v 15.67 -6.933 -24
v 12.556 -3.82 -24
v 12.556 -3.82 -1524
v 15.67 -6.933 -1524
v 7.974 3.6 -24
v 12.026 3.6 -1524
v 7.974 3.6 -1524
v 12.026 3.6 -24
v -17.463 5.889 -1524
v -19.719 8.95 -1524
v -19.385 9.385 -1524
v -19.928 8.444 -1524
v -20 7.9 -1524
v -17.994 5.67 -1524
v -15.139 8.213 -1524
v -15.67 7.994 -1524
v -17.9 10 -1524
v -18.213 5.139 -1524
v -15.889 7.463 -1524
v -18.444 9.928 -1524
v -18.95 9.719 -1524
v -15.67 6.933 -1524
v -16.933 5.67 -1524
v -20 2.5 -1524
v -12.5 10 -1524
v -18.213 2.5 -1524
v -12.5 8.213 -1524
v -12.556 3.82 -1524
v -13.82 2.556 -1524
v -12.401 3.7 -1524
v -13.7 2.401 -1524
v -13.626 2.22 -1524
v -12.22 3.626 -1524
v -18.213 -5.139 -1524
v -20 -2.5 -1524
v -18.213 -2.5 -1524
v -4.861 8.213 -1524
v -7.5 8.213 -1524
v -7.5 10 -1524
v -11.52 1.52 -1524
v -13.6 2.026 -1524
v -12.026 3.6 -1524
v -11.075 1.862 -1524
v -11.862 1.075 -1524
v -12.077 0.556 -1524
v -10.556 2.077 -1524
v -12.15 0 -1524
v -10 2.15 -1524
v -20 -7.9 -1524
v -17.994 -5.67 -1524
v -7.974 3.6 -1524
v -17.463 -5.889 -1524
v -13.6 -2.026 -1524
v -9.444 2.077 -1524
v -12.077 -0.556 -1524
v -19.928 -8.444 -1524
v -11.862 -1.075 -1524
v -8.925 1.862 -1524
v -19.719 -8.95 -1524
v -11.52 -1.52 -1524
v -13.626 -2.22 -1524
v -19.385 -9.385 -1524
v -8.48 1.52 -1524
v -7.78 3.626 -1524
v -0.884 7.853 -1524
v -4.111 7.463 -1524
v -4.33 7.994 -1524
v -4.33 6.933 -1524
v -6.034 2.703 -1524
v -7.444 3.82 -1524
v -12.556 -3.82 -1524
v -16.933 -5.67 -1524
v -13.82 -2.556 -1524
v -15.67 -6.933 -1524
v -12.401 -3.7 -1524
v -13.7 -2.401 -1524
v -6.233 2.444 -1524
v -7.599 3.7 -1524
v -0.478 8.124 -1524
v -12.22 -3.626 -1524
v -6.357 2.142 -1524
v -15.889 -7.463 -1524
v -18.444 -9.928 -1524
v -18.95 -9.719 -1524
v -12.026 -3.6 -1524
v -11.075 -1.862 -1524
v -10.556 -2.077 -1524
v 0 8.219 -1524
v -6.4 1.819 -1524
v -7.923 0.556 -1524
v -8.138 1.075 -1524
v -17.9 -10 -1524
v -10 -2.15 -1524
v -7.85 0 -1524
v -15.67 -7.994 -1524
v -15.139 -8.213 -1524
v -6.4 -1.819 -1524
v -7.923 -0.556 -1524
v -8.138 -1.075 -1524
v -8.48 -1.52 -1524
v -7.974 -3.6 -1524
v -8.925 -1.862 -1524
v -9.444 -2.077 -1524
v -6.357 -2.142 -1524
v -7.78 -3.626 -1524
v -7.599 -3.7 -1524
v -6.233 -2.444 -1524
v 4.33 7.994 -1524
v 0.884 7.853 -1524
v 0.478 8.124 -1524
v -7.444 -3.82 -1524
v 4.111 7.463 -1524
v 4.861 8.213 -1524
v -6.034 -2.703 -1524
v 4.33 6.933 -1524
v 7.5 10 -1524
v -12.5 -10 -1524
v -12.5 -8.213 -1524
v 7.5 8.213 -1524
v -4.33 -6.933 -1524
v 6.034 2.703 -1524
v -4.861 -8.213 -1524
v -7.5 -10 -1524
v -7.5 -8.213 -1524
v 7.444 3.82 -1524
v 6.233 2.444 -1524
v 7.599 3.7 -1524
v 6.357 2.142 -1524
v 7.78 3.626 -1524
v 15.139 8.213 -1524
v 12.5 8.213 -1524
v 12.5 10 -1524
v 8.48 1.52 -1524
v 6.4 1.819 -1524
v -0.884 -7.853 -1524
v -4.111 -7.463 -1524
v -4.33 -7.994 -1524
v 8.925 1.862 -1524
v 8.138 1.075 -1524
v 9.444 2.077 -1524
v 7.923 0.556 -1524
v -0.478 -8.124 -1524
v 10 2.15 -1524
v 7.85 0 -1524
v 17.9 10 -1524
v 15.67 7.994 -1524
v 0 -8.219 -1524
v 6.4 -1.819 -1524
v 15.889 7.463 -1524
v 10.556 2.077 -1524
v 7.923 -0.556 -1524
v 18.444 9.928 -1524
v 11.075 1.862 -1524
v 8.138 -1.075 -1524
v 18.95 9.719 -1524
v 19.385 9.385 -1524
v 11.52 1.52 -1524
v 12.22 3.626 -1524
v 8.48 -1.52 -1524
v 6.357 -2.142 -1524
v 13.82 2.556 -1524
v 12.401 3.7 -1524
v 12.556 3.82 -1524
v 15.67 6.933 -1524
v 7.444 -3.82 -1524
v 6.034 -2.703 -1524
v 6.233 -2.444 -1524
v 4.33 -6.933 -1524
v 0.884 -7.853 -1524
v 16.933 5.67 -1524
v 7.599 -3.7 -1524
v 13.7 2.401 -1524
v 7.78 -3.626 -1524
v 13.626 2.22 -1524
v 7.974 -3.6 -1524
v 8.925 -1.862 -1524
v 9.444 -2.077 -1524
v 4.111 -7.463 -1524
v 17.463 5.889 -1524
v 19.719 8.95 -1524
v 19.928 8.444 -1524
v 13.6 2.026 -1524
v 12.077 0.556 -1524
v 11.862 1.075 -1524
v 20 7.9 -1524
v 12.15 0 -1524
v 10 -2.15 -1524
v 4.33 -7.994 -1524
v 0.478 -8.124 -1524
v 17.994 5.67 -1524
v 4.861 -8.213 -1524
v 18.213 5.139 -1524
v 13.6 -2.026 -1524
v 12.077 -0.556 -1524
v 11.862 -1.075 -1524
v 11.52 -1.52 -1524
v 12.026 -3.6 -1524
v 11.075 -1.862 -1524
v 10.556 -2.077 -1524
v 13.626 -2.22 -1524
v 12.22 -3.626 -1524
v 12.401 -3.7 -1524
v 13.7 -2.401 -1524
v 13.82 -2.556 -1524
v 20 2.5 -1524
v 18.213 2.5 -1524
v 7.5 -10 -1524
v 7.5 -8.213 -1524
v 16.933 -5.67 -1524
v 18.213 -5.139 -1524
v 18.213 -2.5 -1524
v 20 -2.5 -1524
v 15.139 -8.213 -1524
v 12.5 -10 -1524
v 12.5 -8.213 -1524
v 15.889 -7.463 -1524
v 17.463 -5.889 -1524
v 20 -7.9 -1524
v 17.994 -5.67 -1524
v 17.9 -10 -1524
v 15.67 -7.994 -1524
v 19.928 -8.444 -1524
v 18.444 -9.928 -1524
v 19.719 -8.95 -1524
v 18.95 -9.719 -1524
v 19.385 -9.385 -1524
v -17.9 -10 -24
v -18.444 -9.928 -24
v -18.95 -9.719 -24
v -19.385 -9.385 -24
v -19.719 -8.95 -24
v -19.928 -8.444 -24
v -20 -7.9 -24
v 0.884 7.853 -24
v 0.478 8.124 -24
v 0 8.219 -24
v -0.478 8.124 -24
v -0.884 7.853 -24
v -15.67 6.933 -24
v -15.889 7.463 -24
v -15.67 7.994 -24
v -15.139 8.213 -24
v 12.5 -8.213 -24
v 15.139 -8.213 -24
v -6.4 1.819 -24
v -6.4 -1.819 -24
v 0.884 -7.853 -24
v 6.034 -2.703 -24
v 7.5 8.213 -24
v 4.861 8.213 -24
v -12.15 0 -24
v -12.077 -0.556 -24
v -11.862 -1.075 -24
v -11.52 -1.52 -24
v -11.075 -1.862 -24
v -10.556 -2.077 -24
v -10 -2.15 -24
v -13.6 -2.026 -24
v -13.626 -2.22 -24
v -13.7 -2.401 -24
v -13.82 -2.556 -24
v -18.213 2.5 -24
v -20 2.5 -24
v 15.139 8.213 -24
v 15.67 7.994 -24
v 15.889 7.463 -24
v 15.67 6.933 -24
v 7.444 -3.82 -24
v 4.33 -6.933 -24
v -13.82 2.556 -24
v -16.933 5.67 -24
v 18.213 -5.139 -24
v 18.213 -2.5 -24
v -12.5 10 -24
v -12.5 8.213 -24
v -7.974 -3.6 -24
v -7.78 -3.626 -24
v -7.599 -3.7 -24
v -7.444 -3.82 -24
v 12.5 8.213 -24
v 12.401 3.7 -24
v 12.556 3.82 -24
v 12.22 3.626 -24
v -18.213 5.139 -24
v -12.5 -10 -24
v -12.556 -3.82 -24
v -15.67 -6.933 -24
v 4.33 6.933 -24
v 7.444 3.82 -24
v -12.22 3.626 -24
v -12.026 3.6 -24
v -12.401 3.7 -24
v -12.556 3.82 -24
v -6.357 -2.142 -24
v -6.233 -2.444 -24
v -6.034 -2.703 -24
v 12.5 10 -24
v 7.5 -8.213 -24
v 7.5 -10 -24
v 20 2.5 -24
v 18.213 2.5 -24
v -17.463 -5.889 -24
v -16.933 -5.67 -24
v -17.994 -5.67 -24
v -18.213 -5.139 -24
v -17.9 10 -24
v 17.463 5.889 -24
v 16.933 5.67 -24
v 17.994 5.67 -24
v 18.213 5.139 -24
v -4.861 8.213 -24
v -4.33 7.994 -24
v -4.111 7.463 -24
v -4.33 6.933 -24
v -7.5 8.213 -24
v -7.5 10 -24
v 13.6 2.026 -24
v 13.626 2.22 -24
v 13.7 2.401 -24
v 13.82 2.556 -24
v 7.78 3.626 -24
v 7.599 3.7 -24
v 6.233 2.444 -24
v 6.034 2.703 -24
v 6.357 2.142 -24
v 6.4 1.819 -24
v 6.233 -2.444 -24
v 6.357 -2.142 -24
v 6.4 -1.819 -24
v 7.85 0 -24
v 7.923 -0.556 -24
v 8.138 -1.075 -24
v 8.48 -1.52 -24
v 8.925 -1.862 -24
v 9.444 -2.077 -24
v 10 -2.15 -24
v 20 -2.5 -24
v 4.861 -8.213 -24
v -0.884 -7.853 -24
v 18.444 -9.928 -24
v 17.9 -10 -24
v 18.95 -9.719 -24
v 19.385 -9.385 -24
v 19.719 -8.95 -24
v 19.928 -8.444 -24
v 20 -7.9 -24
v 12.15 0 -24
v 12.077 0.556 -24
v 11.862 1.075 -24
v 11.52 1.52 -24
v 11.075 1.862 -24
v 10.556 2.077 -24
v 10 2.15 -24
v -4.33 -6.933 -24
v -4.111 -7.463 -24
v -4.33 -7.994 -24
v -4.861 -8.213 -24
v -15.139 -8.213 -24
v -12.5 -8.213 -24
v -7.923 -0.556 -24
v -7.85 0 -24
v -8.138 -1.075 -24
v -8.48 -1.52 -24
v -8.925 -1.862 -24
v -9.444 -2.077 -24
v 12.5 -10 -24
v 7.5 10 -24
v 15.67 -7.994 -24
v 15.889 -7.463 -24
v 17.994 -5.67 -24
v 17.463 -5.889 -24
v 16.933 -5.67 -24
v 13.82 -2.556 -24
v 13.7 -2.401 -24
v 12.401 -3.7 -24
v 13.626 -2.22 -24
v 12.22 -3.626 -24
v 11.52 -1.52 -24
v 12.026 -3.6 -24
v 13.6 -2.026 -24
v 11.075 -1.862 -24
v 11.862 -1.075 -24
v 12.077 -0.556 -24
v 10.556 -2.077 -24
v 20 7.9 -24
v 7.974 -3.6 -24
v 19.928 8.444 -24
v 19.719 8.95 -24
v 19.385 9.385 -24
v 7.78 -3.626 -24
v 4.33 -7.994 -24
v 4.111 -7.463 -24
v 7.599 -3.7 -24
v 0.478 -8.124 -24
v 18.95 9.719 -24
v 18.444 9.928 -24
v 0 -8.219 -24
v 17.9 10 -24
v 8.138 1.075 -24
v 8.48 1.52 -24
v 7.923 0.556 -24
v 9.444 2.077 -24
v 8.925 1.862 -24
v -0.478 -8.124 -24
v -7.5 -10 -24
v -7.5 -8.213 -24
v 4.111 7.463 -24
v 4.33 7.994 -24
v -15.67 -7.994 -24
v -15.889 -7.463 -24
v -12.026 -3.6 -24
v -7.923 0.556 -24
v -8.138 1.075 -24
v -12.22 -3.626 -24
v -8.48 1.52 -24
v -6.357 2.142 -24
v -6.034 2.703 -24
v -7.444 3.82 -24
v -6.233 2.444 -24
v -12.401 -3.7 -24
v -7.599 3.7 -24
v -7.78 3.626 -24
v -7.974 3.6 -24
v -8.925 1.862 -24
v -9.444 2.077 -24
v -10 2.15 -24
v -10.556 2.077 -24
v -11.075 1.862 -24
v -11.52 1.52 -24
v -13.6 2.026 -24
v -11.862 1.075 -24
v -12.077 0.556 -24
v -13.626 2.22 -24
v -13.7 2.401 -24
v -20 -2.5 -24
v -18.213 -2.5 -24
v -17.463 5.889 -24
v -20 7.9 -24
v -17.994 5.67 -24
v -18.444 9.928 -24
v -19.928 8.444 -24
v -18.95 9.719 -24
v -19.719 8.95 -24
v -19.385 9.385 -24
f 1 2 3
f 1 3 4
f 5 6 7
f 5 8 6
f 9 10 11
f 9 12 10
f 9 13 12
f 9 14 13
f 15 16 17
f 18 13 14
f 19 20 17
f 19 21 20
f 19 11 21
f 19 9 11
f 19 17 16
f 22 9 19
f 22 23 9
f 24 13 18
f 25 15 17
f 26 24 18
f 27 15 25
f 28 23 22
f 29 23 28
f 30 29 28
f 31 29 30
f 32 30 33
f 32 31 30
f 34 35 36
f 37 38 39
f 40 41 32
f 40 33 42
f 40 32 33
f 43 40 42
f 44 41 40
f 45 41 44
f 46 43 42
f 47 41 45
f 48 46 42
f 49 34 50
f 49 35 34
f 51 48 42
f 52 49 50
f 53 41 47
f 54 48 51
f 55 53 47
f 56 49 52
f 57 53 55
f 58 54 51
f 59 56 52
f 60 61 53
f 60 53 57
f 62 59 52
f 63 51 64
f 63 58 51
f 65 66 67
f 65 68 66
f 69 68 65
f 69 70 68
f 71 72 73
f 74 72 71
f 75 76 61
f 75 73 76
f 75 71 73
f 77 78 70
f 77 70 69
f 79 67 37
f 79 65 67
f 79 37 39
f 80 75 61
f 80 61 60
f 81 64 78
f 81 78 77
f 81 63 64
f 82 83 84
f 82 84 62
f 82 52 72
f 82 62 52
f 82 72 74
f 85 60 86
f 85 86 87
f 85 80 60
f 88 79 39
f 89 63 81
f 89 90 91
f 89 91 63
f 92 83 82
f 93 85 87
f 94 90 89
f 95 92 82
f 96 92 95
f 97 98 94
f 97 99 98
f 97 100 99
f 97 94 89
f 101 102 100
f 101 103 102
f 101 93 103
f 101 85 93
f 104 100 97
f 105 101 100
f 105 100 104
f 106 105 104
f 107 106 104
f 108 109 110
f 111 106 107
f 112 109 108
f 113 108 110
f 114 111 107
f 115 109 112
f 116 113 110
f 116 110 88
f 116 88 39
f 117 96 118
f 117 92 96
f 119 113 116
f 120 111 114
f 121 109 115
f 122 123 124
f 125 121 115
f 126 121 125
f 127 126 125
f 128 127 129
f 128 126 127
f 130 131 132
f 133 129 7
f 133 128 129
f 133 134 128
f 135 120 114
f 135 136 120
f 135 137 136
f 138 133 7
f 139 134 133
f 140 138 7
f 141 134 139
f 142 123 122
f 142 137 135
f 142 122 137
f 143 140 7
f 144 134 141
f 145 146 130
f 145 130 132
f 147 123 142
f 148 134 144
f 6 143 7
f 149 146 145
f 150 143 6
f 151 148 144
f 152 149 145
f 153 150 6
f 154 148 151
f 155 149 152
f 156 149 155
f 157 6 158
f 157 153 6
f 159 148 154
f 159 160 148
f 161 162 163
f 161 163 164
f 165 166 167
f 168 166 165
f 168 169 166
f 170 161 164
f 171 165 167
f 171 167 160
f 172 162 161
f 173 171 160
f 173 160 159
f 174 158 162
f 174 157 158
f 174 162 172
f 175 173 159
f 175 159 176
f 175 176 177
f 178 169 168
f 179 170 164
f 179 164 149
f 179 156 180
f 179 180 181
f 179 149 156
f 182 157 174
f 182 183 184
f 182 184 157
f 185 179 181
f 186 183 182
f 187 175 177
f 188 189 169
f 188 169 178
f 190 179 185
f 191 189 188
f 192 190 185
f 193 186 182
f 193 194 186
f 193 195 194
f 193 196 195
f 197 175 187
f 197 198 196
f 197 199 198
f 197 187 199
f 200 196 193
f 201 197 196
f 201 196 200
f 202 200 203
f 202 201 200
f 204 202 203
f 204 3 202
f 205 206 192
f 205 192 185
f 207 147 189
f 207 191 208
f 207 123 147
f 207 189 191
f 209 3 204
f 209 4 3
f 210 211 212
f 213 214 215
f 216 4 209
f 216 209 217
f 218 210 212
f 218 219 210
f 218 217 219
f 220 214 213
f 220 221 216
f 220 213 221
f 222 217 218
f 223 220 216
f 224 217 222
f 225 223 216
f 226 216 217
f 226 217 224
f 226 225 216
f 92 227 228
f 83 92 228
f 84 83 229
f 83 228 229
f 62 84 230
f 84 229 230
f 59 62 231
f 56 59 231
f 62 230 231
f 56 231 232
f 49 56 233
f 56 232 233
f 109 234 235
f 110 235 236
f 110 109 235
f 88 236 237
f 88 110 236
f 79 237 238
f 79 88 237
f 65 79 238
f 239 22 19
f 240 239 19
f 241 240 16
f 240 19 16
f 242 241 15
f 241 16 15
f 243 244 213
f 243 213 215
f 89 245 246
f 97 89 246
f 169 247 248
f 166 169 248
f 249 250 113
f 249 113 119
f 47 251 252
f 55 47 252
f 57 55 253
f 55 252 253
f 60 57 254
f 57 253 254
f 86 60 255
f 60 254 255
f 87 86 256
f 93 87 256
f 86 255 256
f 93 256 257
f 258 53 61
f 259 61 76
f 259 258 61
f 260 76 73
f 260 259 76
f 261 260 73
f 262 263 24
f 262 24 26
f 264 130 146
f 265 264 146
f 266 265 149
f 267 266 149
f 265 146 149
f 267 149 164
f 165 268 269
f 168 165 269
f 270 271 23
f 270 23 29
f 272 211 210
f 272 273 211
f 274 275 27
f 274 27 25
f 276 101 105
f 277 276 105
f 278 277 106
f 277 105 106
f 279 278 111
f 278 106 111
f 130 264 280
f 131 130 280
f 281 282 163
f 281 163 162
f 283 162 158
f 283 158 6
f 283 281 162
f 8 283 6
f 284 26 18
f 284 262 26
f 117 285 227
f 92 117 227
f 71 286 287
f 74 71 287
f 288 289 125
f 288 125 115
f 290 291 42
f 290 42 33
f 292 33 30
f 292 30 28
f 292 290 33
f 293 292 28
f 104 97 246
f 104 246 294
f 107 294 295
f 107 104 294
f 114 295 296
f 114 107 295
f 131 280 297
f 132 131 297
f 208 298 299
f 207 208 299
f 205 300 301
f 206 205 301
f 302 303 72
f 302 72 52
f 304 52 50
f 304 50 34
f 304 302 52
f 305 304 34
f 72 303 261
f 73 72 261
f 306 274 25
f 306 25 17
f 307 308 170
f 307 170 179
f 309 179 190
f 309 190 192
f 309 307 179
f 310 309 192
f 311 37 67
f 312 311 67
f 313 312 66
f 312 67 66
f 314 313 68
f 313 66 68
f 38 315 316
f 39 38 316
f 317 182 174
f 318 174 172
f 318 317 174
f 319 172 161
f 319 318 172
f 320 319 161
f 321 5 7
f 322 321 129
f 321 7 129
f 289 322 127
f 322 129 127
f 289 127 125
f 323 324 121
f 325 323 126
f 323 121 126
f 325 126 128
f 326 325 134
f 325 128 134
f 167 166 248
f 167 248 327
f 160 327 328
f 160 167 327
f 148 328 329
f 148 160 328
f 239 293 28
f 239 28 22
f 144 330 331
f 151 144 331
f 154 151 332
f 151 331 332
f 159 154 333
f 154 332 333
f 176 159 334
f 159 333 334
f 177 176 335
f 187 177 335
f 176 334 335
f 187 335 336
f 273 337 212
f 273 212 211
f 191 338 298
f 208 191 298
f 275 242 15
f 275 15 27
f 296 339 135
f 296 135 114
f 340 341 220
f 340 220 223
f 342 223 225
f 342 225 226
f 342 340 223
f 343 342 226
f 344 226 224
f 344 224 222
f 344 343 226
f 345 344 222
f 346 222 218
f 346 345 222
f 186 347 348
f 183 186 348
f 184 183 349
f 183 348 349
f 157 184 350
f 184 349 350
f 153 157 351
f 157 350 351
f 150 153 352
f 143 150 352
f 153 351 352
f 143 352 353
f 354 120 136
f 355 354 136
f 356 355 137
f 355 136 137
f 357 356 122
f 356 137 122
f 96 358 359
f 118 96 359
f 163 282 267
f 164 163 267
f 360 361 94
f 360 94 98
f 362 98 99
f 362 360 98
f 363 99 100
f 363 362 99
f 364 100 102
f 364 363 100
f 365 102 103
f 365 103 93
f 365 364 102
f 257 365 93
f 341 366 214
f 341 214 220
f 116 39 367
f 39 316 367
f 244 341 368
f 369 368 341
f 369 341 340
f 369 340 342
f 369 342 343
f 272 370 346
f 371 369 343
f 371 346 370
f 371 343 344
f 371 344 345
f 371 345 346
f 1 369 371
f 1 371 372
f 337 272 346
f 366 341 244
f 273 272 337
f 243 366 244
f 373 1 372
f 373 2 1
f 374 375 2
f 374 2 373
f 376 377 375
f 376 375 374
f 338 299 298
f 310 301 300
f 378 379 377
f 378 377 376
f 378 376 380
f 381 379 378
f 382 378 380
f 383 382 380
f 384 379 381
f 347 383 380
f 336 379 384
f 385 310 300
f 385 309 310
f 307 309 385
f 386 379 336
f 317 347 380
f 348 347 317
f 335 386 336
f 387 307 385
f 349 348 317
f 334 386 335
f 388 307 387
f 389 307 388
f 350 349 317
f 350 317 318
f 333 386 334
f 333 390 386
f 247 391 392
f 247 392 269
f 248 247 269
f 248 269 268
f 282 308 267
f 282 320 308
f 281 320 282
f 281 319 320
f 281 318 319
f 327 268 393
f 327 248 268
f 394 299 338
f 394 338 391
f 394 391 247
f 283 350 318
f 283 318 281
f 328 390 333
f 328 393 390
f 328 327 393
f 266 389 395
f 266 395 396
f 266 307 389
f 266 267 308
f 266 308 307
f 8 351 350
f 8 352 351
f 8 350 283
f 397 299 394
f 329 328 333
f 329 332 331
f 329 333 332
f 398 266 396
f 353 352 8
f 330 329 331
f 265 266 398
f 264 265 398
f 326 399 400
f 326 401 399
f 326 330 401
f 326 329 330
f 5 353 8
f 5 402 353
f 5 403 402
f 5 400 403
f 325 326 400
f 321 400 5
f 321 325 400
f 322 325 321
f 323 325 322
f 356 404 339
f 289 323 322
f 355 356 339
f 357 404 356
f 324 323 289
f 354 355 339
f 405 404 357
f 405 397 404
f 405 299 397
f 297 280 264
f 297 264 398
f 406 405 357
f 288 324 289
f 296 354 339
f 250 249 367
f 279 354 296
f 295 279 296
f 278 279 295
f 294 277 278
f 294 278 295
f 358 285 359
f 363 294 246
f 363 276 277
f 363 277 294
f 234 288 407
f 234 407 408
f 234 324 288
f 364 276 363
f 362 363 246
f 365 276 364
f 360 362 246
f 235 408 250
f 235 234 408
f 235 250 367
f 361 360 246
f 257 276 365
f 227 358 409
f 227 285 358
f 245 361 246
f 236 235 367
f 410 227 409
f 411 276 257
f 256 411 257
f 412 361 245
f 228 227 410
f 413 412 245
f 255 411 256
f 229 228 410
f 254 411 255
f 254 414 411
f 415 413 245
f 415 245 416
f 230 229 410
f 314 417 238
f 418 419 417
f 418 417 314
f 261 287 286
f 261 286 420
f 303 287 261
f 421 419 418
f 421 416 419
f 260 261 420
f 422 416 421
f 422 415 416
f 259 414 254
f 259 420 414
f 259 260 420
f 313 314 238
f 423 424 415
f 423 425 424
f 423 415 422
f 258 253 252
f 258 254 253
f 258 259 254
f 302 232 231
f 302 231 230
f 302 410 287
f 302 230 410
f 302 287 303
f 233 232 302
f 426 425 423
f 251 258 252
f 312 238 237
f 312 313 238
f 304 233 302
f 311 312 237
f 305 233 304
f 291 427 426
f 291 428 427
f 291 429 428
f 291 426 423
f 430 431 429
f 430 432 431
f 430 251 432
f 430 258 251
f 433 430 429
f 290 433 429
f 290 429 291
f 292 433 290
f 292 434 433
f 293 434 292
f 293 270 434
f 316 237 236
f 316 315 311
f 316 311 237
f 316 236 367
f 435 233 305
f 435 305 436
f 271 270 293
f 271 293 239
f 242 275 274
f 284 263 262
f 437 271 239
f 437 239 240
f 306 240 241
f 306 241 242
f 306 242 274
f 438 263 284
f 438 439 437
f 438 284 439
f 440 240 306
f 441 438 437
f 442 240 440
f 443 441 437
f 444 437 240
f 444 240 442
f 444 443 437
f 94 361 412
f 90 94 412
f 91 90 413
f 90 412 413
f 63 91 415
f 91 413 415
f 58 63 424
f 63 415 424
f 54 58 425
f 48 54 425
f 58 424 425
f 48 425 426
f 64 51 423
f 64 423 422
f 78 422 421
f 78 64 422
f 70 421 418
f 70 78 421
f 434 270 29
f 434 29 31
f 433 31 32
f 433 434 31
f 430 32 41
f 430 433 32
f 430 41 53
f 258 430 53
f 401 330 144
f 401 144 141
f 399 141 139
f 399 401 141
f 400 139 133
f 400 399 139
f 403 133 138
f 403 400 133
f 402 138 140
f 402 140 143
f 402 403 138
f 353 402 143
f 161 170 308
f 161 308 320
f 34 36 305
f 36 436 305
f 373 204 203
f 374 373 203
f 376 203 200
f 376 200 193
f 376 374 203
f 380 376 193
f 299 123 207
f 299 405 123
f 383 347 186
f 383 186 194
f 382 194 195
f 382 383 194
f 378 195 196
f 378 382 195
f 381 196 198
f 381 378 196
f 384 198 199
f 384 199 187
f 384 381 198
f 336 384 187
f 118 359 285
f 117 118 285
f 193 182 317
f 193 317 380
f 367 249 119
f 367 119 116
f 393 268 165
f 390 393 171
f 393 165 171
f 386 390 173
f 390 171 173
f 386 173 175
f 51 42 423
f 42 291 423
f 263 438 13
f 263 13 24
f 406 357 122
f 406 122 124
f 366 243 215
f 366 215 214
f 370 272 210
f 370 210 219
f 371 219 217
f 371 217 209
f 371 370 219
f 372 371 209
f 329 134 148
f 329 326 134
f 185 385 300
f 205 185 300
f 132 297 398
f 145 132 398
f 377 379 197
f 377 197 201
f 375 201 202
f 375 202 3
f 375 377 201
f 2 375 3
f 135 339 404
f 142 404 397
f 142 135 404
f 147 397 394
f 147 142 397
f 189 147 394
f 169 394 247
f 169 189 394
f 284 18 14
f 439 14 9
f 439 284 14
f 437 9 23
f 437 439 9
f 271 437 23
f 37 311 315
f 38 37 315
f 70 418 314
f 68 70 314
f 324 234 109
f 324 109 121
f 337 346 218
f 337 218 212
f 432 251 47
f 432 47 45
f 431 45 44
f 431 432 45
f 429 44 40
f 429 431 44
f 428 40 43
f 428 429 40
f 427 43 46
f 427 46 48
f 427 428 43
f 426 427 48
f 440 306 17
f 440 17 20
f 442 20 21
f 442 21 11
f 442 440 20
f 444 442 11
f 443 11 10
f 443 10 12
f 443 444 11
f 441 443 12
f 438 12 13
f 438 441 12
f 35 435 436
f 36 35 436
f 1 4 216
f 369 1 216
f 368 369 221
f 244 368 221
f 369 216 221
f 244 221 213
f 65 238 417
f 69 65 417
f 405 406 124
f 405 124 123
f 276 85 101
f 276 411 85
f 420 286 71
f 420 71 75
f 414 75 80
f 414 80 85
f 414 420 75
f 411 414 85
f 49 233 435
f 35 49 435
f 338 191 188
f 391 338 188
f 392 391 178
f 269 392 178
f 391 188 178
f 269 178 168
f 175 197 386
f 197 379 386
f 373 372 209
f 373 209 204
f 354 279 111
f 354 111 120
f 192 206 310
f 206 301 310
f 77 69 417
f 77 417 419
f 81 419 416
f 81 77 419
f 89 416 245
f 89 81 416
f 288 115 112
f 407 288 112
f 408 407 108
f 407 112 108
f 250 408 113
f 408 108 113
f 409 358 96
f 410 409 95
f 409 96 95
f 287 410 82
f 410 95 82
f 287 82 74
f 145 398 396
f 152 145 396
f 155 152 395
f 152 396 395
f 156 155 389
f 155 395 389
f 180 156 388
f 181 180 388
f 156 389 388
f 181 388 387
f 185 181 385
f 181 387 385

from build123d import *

# Parameters (mm, degrees)
BOSS_EXTRUDE1_DEPTH = 1524
BOSS_EXTRUDE2_DEPTH = 1524
FILLET1_R           = 0.75
FILLET2_R           = 1.25
SKETCH5_W           = 1548
SKETCH5_H           = 20
CUT_EXTRUDE1_DEPTH  = 1525.55764076


with BuildPart() as part:
    # Sketch3 → Boss-Extrude1 (new, symmetric)
    with BuildSketch(Plane.XY):
        with BuildLine():
            Line((12.5, -10), (17.9, -10))
            ThreePointArc((17.9, -10), (19.38492424, -9.38492424), (20, -7.9))
            Line((20, -7.9), (20, -2.5))
            Line((20, -2.5), (18.213351365, -2.5))
            Line((18.213351365, -2.5), (18.213351365, -6.95))
            Line((18.213351365, -6.95), (13.6, -2.336648635))
            Line((13.6, -2.336648635), (13.6, 0))
            Line((13.6, 0), (12.15, 0))
            ThreePointArc((12.15, 0), (11.52027958, -1.52027958), (10, -2.15))
            Line((10, -2.15), (10, -3.6))
            Line((10, -3.6), (12.336648635, -3.6))
            Line((12.336648635, -3.6), (16.95, -8.213351365))
            Line((16.95, -8.213351365), (12.5, -8.213351365))
            Line((12.5, -8.213351365), (12.5, -10))
        make_face()
    extrude(amount=BOSS_EXTRUDE1_DEPTH, both=True)

    # Sketch4 → Boss-Extrude2 (add, symmetric)
    with BuildSketch(Plane.XY):
        with BuildLine():
            Line((10, -3.6), (7.663351365, -3.6))
            Line((7.663351365, -3.6), (3.05, -8.213351365))
            Line((3.05, -8.213351365), (7.5, -8.213351365))
            Line((7.5, -8.213351365), (7.5, -10))
            Line((7.5, -10), (0, -10))
            Line((0, -10), (0, -8.736648635))
            Line((0, -8.736648635), (6.4, -2.336648635))
            Line((6.4, -2.336648635), (6.4, 0))
            Line((6.4, 0), (7.85, 0))
            ThreePointArc((7.85, 0), (8.47972042, -1.52027958), (10, -2.15))
            Line((10, -2.15), (10, -3.6))
        make_face()
    extrude(amount=BOSS_EXTRUDE2_DEPTH, both=True)

    # Mirror1: part across plane


with BuildPart() as part_1:
    add(part.part)
    add(part.part.mirror(Plane(origin=(0, 0, 0), x_dir=(0, 0, 1), z_dir=(1, 0, 0))))

    # Mirror2: part across plane


with BuildPart() as part_2:
    add(part_1.part)
    add(part_1.part.mirror(Plane.ZX))

    # Fillet1
    fillet1_edges = [part_2.edges().sort_by_distance(p)[0] for p in [
        (18.213351365, 6.95, 0),
        (13.6, 2.336648635, 0),
        (12.336648635, 3.6, 0),
        (16.95, 8.213351365, 0),
        (3.05, 8.213351365, 0),
        (7.663351365, 3.6, 0),
        (-18.213351365, 6.95, 0),
        (-13.6, 2.336648635, 0),
        (-7.663351365, 3.6, 0),
        (-12.336648635, 3.6, 0),
        (-16.95, 8.213351365, 0),
        (-3.05, 8.213351365, 0),
        (16.95, -8.213351365, 0),
        (12.336648635, -3.6, 0),
        (13.6, -2.336648635, 0),
        (18.213351365, -6.95, 0),
        (3.05, -8.213351365, 0),
        (7.663351365, -3.6, 0),
        (-18.213351365, -6.95, 0),
        (-13.6, -2.336648635, 0),
        (-12.336648635, -3.6, 0),
        (-16.95, -8.213351365, 0),
        (-3.05, -8.213351365, 0),
        (-7.663351365, -3.6, 0),
    ]]
    fillet(fillet1_edges, radius=FILLET1_R)

    # Fillet2
    fillet2_edges = [part_2.edges().sort_by_distance(p)[0] for p in [
        (6.4, 2.336648635, 0),
        (0, 8.736648635, 0),
        (-6.4, 2.336648635, 0),
        (6.4, -2.336648635, 0),
        (-6.4, -2.336648635, 0),
        (0, -8.736648635, 0),
    ]]
    fillet(fillet2_edges, radius=FILLET2_R)

    # Sketch5 → Cut-Extrude1 (cut, through all)
    with BuildSketch(Plane.ZY.offset(20)):
        with Locations((750, 0)):
            Rectangle(SKETCH5_W, SKETCH5_H)
    extrude(amount=-CUT_EXTRUDE1_DEPTH, mode=Mode.SUBTRACT)


solid = part_2.part
